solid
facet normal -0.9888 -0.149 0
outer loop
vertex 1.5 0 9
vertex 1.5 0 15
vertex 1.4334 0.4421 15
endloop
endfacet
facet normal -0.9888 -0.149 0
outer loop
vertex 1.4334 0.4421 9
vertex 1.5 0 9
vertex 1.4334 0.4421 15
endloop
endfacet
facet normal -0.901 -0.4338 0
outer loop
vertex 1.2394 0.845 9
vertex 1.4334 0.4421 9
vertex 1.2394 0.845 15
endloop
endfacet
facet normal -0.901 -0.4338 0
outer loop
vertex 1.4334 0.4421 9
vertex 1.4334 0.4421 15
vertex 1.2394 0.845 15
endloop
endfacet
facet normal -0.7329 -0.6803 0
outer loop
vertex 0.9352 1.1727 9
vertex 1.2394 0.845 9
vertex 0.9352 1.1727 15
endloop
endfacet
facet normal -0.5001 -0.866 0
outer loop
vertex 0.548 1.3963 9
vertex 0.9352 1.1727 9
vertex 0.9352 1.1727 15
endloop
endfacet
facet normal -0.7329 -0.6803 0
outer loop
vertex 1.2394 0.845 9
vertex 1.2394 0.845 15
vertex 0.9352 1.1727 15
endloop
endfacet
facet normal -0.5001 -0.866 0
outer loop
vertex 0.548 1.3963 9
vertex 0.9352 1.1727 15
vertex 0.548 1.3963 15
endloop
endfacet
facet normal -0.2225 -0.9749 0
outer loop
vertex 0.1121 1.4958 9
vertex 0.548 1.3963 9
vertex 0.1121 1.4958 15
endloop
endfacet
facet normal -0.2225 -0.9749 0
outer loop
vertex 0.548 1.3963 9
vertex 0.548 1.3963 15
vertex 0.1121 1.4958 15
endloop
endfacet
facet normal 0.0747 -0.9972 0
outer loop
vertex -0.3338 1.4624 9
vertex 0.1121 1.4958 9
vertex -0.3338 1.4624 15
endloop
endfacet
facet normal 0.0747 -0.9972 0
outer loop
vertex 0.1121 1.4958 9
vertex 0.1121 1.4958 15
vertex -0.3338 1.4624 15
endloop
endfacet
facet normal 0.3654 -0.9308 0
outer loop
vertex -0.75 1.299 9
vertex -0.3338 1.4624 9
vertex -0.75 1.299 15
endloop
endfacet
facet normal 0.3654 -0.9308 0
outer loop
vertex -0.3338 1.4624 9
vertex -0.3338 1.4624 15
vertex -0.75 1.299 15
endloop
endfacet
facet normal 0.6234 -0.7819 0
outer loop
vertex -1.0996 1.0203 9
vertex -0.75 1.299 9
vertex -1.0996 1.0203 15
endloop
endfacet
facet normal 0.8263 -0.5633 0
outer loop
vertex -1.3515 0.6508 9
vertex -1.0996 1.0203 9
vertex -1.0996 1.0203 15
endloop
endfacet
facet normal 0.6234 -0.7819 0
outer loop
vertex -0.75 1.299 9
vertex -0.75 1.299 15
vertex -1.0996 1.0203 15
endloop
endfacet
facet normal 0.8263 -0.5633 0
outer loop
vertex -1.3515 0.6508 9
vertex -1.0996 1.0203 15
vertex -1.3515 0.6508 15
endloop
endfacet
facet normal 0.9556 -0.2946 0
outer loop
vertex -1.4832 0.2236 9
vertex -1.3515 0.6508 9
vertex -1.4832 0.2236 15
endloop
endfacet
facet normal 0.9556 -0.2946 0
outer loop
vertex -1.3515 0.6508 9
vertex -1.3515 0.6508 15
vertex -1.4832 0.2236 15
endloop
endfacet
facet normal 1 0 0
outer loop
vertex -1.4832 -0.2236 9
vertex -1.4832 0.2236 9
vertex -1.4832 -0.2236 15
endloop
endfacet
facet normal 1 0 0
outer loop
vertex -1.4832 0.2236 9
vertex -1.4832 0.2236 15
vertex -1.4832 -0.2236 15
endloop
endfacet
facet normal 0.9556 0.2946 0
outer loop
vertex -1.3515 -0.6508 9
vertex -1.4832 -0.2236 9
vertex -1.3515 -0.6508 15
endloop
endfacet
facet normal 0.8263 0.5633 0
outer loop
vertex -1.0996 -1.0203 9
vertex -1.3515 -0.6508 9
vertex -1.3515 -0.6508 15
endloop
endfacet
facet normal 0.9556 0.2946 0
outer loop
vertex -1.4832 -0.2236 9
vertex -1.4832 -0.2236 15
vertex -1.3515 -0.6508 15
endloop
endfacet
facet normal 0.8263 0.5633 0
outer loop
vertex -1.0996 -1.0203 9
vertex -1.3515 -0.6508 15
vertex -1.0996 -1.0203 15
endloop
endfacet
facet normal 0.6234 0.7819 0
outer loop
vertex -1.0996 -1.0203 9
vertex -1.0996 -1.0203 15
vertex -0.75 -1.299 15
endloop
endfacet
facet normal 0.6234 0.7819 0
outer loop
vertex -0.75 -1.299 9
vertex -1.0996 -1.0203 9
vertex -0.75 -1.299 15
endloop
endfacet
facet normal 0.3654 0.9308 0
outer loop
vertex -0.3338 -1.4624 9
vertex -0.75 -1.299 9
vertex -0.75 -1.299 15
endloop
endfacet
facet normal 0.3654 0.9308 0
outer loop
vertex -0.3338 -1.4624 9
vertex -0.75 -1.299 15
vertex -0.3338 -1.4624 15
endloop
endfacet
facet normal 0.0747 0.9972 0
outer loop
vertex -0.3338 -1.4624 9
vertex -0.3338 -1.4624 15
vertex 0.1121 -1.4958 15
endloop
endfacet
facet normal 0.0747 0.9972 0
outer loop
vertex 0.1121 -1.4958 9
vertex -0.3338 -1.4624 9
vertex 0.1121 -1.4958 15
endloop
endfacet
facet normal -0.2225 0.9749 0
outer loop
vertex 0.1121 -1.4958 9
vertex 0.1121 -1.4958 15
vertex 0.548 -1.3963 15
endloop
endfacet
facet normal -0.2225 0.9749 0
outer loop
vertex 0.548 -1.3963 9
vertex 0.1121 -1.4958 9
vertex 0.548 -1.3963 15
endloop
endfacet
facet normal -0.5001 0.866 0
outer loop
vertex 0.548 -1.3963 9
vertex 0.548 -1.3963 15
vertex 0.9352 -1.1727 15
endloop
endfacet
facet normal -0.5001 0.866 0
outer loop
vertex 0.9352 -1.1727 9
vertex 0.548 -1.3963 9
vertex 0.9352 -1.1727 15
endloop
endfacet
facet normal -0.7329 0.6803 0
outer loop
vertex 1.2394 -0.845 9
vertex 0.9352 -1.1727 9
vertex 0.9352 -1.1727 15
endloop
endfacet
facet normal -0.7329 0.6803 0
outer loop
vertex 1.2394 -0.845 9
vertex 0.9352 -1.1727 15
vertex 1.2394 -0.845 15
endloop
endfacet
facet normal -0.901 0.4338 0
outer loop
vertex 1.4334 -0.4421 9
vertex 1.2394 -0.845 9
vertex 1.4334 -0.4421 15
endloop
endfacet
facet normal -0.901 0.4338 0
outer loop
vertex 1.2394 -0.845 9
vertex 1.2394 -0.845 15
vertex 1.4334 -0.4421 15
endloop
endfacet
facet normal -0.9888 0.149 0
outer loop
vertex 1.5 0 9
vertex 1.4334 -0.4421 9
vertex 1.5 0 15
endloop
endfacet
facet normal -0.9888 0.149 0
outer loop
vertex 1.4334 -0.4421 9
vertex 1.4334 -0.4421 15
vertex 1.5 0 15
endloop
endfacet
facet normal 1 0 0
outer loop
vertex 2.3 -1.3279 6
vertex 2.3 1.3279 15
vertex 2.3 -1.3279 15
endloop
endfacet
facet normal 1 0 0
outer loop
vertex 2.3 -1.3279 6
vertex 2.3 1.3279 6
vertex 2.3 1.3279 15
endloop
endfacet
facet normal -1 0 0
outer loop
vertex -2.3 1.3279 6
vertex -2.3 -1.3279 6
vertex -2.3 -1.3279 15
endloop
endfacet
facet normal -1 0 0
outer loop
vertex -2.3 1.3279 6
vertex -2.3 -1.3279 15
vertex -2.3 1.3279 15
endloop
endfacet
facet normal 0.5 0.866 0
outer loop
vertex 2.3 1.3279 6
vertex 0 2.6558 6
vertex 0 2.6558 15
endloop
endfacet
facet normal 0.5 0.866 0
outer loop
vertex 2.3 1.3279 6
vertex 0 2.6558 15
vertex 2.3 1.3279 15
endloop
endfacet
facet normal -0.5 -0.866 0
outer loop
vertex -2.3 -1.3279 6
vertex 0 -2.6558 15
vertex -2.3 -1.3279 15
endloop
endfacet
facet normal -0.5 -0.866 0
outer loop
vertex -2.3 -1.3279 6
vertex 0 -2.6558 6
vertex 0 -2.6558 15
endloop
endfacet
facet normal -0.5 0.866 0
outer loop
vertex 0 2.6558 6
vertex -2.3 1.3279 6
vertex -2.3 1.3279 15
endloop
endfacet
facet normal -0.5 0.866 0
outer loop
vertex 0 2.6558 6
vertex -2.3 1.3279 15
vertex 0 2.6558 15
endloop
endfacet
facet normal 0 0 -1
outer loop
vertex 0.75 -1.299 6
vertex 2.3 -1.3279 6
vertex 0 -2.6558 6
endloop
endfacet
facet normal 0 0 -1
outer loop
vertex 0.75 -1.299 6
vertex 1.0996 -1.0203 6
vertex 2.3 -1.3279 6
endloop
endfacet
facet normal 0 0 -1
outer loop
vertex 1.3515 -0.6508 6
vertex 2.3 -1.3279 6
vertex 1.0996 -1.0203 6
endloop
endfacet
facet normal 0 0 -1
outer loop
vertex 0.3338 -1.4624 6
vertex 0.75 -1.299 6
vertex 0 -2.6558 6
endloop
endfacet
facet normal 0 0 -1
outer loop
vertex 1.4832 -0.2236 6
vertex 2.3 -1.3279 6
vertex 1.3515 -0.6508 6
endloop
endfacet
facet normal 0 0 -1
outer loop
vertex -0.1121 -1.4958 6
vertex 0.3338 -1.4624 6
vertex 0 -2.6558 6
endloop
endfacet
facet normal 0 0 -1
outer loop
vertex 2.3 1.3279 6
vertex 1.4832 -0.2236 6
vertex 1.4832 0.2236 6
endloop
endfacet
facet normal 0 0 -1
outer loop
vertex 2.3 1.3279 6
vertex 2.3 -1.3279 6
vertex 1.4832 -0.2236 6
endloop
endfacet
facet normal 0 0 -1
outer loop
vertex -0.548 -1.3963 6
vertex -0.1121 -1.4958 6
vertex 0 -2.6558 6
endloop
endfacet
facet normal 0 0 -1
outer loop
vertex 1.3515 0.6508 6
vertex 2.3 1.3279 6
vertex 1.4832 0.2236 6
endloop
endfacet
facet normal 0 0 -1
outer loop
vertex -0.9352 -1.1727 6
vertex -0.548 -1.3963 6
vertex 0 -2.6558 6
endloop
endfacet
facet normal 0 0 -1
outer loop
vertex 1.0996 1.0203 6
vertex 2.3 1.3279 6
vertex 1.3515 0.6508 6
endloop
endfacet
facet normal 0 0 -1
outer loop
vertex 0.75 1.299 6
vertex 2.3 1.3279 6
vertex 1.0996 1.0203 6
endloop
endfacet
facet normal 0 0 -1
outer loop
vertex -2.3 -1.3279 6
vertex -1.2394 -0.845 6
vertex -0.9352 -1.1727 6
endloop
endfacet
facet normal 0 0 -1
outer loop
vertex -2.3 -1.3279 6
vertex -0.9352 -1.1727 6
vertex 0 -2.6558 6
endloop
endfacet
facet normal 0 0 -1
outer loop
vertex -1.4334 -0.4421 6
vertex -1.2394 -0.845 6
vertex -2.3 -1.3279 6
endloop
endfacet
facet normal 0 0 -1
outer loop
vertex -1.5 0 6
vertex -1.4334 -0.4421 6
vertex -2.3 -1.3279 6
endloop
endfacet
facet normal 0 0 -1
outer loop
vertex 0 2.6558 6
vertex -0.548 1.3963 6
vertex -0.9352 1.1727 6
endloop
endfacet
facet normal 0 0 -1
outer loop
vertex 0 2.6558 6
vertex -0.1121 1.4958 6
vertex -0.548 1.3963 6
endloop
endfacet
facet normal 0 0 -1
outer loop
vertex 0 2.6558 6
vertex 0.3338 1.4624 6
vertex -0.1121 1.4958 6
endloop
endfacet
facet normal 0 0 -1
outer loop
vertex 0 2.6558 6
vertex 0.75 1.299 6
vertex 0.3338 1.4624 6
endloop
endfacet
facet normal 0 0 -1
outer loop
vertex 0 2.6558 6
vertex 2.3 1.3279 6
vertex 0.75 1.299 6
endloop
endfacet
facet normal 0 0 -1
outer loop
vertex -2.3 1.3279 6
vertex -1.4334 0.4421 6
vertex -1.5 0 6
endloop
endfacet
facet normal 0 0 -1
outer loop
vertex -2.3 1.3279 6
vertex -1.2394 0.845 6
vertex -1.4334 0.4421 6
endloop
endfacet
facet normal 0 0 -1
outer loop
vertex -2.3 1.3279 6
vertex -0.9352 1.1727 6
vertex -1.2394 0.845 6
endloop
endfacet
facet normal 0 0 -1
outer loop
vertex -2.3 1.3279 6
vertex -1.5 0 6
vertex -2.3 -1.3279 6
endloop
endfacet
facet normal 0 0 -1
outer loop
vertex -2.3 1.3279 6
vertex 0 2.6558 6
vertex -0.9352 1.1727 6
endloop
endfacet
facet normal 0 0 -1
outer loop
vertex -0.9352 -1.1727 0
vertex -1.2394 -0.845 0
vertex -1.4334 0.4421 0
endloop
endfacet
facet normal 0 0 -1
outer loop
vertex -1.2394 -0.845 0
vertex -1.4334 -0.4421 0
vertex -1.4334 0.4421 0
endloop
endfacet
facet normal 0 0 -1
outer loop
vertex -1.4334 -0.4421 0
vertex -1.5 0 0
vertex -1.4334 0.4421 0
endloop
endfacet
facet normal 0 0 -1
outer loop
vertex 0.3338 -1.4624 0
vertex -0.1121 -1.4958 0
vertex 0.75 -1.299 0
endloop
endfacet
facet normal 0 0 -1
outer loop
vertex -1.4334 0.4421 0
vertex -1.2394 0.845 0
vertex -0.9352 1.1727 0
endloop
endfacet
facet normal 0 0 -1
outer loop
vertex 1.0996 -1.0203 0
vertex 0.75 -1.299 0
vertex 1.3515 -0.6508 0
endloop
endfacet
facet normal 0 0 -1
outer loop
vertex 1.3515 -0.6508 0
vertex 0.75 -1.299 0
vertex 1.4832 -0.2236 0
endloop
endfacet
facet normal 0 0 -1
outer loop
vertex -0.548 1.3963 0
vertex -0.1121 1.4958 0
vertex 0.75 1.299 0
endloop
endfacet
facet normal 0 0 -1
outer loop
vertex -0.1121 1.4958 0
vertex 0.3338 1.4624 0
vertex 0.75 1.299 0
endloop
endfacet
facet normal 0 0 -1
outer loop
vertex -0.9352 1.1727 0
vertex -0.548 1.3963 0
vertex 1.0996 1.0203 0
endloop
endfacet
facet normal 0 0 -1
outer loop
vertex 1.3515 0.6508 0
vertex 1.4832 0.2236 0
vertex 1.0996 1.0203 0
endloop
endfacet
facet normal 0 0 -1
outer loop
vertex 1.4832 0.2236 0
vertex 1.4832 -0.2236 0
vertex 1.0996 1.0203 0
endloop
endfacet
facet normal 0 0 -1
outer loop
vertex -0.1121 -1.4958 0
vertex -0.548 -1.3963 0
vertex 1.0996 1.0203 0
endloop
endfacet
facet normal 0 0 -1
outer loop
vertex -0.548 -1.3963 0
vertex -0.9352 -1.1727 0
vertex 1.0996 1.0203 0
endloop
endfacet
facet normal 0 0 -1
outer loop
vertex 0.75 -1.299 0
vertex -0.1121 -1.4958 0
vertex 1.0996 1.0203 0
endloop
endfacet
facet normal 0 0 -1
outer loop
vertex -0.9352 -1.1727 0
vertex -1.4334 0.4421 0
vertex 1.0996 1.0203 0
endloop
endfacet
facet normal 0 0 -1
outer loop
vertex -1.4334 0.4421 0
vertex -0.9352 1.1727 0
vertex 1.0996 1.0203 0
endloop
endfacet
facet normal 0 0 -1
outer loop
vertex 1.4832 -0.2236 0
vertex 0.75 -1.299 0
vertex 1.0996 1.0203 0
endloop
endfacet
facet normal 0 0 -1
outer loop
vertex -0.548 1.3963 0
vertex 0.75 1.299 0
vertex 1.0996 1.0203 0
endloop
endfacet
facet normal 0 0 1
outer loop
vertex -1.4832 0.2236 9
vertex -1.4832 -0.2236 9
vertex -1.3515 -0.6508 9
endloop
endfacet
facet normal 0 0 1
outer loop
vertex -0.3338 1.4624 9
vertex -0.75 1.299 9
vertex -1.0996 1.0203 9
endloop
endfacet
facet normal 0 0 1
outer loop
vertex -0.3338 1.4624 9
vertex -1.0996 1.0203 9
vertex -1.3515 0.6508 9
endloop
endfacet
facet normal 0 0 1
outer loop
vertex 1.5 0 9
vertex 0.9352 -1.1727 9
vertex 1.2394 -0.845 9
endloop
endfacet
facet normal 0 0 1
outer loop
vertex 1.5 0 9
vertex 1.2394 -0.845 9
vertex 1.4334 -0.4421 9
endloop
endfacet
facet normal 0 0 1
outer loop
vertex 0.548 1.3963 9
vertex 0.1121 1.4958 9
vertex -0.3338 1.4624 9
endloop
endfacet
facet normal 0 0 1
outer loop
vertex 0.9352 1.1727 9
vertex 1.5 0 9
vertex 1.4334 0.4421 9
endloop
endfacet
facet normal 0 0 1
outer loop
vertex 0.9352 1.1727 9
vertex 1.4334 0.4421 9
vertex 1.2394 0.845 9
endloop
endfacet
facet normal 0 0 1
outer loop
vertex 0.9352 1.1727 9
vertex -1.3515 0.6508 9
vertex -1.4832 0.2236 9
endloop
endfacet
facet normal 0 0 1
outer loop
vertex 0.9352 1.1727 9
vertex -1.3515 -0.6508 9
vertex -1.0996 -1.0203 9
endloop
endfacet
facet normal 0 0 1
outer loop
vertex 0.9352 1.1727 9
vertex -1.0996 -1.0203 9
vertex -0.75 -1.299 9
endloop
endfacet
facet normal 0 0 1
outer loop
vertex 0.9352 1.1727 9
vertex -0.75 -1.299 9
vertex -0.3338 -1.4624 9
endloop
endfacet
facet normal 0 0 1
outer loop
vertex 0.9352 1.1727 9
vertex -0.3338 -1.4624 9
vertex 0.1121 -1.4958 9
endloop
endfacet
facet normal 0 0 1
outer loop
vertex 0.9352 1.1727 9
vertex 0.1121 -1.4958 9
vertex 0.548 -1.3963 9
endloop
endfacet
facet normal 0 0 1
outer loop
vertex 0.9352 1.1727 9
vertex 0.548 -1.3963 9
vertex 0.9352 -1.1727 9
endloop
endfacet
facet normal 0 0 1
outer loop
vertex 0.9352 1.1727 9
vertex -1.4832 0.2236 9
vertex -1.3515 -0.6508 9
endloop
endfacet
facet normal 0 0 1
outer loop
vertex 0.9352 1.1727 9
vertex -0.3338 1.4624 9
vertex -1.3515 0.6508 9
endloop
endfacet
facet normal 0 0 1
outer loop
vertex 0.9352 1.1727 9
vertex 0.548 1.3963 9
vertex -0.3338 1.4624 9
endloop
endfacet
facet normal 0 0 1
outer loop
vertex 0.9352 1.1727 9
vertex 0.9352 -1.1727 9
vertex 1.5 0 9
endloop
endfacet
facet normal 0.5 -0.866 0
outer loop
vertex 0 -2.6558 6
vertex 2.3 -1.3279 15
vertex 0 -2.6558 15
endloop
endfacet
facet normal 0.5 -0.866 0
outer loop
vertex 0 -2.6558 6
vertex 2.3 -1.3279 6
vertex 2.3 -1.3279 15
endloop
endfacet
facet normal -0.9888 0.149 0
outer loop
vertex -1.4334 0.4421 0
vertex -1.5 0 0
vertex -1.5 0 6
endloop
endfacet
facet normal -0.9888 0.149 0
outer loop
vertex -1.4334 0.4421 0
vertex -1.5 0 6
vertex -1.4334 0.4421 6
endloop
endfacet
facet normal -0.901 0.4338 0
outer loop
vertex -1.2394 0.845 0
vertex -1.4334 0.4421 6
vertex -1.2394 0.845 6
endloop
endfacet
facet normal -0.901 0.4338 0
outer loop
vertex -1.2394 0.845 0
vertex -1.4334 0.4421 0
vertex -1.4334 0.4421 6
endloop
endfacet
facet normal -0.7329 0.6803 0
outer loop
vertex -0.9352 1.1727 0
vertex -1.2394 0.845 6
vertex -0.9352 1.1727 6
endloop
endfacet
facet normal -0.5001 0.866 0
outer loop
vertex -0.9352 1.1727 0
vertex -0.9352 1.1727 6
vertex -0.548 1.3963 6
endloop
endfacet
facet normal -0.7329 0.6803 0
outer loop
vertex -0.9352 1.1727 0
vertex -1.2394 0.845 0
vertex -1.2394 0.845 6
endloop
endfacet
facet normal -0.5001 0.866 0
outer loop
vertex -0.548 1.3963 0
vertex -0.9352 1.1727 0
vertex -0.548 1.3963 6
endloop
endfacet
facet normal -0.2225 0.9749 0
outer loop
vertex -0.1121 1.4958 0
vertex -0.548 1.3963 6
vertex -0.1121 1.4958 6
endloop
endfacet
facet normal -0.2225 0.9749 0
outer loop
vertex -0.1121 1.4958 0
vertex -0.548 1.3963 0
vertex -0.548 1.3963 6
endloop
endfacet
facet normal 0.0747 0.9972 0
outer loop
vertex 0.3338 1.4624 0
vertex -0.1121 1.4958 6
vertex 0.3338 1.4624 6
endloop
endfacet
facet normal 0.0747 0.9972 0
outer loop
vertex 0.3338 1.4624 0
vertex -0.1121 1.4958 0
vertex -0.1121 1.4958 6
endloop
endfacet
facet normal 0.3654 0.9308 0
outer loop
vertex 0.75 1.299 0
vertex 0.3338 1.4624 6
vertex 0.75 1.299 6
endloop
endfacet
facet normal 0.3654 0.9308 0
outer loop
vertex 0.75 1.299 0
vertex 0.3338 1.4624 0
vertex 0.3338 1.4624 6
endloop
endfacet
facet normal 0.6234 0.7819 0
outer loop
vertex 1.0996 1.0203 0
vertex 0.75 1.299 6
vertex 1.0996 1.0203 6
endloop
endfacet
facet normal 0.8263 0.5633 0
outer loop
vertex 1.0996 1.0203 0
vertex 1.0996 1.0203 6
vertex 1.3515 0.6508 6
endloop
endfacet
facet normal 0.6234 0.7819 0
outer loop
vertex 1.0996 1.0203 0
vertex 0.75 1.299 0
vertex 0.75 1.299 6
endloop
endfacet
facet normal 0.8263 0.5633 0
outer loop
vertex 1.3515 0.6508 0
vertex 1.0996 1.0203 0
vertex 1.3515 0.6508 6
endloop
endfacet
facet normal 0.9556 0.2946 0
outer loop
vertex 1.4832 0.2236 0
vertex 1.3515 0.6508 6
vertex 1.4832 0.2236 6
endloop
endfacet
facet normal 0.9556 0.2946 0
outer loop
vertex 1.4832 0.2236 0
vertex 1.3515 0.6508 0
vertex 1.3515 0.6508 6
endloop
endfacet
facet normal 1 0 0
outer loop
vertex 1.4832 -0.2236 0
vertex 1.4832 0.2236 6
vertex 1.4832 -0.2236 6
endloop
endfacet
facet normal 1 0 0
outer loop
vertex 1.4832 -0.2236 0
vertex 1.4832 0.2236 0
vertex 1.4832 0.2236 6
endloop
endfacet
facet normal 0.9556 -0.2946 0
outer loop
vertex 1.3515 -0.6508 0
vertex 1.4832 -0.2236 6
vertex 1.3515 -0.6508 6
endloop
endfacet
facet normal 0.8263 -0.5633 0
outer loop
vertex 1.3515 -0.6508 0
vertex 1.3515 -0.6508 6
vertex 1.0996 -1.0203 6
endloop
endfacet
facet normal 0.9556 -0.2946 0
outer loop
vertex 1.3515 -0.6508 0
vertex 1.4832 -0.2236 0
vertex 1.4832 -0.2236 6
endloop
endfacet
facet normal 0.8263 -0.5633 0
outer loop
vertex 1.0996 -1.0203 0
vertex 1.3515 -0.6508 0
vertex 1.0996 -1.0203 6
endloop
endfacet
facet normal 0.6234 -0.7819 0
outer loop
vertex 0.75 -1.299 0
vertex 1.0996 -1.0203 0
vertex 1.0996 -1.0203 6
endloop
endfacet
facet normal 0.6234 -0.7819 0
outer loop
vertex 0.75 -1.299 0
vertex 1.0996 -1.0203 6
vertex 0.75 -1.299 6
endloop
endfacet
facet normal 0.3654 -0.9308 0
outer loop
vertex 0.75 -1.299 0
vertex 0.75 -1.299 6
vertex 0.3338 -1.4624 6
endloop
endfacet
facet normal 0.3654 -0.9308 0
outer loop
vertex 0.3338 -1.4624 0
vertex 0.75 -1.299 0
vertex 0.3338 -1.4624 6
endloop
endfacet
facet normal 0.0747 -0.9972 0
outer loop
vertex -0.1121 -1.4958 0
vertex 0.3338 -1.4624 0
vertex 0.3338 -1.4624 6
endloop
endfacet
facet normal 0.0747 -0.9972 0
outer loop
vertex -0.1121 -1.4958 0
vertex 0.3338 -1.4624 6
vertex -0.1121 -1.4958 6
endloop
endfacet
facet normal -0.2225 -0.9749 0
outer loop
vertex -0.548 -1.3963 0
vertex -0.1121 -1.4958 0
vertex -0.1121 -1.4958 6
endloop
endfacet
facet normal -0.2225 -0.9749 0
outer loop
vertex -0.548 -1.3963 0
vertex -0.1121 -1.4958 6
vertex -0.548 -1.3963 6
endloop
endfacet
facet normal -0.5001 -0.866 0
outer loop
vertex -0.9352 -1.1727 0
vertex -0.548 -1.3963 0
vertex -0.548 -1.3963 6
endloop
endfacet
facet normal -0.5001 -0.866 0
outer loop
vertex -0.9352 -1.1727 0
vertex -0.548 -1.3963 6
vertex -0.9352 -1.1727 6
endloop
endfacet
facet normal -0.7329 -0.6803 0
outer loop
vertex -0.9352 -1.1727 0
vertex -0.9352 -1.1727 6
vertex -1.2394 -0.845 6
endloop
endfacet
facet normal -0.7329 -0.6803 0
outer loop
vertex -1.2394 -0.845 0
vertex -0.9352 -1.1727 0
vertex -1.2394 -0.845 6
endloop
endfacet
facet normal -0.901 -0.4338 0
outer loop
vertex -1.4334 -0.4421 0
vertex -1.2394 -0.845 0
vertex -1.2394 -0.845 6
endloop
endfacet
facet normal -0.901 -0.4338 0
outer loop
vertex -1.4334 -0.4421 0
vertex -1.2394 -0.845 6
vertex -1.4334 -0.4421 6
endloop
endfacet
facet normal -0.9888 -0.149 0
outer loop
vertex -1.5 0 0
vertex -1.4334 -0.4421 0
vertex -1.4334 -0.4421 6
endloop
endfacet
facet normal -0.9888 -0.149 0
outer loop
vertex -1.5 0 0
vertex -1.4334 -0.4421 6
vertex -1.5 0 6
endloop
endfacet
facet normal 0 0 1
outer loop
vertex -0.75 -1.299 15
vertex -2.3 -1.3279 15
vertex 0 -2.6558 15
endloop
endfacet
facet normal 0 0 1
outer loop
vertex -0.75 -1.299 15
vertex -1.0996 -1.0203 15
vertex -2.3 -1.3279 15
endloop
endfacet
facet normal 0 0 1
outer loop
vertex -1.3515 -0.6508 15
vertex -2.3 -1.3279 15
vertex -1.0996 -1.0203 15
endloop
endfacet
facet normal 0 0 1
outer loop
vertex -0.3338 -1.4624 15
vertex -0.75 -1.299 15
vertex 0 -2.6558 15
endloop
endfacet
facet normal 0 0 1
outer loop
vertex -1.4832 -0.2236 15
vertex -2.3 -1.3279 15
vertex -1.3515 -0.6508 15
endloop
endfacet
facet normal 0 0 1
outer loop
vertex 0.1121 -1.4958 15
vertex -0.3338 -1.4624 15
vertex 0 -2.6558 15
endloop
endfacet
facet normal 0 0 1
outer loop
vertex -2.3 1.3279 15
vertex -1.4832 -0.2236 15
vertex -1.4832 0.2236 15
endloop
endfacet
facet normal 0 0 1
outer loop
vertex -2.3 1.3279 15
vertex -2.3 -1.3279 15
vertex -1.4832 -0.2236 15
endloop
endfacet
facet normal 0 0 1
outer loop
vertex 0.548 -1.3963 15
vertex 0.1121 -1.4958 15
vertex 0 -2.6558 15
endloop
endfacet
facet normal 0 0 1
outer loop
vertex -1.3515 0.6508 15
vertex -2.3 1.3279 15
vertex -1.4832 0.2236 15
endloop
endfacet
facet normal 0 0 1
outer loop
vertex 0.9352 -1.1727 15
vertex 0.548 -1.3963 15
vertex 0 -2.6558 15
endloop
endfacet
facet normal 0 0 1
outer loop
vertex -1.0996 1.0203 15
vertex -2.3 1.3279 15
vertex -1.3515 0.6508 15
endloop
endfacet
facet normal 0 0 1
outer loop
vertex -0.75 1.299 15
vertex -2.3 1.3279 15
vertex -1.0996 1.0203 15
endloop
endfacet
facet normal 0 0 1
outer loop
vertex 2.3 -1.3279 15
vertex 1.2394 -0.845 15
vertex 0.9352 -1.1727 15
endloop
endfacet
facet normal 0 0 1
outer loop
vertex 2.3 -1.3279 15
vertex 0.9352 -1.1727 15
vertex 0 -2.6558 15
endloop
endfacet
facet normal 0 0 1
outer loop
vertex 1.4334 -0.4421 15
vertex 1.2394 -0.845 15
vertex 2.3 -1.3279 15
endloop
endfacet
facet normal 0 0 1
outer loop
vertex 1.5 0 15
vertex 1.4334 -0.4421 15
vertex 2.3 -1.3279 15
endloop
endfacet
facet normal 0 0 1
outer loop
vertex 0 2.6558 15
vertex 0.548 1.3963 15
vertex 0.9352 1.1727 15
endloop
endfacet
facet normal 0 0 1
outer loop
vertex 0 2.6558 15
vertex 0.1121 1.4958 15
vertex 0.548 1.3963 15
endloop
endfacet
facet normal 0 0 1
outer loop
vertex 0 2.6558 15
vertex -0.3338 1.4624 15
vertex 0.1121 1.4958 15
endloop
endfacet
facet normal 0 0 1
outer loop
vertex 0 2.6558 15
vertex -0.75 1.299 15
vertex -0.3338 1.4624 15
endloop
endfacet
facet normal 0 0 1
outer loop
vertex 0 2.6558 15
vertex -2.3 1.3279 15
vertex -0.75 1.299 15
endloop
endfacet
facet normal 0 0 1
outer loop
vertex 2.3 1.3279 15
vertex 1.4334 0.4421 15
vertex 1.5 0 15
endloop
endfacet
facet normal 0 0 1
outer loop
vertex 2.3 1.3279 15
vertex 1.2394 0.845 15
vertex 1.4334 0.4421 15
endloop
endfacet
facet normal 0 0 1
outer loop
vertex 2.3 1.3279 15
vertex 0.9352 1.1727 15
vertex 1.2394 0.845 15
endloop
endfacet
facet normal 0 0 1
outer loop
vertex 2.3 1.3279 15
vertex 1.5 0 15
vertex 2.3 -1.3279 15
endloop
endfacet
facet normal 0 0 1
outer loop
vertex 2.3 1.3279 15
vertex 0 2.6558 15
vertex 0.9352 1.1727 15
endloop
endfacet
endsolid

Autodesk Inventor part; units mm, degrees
ref_plane "YZ Plane" through (0, 0, 0) normal (1, 0, 0) x (0, 1, 0)
ref_plane "XZ Plane" through (0, 0, 0) normal (0, 1, 0) x (-1, 0, 0)
ref_plane "XY Plane" through (0, 0, 0) normal (0, 0, 1) x (1, 0, 0)
sketch "Sketch6" plane through (0, 0, 0) normal (0, 0, 1) x (1, 0, 0)
  line L0 (0, 2.6558) -> (2.3, 1.3279)
  line L1 (2.3, 1.3279) -> (2.3, -1.3279)
  line L2 (2.3, -1.3279) -> (0, -2.6558)
  line L3 (0, -2.6558) -> (-2.3, -1.3279)
  line L4 (-2.3, -1.3279) -> (-2.3, 1.3279)
  line L5 (-2.3, 1.3279) -> (0, 2.6558)
  point P0 (0, 0)
  point P1 (0, 0)
  dimension "d15" = 4.6
extrude "Extrusion3" add sketch "Sketch6" along normal blind 15
sketch "Sketch7" plane through (0, 0, 0) normal (0, 0, -1) x (-1, 0, 0)
  circle A0 centre (0, 0) radius 1.5
  line L0 (0, 2.6558) -> (2.3, 1.3279) projected
  line L1 (0, 2.6558) -> (2.3, 1.3279)
  line L2 (2.3, 1.3279) -> (2.3, -1.3279)
  line L3 (2.3, -1.3279) -> (0, -2.6558)
  line L4 (0, -2.6558) -> (-2.3, -1.3279)
  line L5 (-2.3, -1.3279) -> (-2.3, 1.3279)
  line L6 (-2.3, 1.3279) -> (0, 2.6558)
  dimension "d18" = 3
extrude "Extrusion4" cut sketch "Sketch7" against normal blind 6
thread "Thread2" size "M3x0.5" class "6g" standard "ISO Metric profile" full length
sketch "Sketch8" plane through (0, 0, 15) normal (0, 0, 1) x (1, 0, 0)
  circle A0 centre (0, 0) radius 1.5
  dimension "d23" = 3
extrude "Extrusion5" cut sketch "Sketch8" against normal blind 6
thread "Thread3" size "M3x0.5" class "6H" standard "ANSI Metric M Profile" full length
equation "\"BendRadius\" = Thickness"
equation "\"BendReliefWidth\" = Thickness"
equation "\"BendReliefDepth\" = 0.5 * Thickness"
equation "\"CornerReliefSize\" = 4 * Thickness"
equation "\"MinimumRemnant\" = 2 * Thickness"
equation "\"TransitionRadius\" = BendRadius"
equation "\"JacobiRadiusSize\" = Thickness"
equation "\"GapSize\" = Thickness"
equation "\"Thickness\" = 0.5"
properties part number "PCB SEPARADOR" material "Stainless Steel"
